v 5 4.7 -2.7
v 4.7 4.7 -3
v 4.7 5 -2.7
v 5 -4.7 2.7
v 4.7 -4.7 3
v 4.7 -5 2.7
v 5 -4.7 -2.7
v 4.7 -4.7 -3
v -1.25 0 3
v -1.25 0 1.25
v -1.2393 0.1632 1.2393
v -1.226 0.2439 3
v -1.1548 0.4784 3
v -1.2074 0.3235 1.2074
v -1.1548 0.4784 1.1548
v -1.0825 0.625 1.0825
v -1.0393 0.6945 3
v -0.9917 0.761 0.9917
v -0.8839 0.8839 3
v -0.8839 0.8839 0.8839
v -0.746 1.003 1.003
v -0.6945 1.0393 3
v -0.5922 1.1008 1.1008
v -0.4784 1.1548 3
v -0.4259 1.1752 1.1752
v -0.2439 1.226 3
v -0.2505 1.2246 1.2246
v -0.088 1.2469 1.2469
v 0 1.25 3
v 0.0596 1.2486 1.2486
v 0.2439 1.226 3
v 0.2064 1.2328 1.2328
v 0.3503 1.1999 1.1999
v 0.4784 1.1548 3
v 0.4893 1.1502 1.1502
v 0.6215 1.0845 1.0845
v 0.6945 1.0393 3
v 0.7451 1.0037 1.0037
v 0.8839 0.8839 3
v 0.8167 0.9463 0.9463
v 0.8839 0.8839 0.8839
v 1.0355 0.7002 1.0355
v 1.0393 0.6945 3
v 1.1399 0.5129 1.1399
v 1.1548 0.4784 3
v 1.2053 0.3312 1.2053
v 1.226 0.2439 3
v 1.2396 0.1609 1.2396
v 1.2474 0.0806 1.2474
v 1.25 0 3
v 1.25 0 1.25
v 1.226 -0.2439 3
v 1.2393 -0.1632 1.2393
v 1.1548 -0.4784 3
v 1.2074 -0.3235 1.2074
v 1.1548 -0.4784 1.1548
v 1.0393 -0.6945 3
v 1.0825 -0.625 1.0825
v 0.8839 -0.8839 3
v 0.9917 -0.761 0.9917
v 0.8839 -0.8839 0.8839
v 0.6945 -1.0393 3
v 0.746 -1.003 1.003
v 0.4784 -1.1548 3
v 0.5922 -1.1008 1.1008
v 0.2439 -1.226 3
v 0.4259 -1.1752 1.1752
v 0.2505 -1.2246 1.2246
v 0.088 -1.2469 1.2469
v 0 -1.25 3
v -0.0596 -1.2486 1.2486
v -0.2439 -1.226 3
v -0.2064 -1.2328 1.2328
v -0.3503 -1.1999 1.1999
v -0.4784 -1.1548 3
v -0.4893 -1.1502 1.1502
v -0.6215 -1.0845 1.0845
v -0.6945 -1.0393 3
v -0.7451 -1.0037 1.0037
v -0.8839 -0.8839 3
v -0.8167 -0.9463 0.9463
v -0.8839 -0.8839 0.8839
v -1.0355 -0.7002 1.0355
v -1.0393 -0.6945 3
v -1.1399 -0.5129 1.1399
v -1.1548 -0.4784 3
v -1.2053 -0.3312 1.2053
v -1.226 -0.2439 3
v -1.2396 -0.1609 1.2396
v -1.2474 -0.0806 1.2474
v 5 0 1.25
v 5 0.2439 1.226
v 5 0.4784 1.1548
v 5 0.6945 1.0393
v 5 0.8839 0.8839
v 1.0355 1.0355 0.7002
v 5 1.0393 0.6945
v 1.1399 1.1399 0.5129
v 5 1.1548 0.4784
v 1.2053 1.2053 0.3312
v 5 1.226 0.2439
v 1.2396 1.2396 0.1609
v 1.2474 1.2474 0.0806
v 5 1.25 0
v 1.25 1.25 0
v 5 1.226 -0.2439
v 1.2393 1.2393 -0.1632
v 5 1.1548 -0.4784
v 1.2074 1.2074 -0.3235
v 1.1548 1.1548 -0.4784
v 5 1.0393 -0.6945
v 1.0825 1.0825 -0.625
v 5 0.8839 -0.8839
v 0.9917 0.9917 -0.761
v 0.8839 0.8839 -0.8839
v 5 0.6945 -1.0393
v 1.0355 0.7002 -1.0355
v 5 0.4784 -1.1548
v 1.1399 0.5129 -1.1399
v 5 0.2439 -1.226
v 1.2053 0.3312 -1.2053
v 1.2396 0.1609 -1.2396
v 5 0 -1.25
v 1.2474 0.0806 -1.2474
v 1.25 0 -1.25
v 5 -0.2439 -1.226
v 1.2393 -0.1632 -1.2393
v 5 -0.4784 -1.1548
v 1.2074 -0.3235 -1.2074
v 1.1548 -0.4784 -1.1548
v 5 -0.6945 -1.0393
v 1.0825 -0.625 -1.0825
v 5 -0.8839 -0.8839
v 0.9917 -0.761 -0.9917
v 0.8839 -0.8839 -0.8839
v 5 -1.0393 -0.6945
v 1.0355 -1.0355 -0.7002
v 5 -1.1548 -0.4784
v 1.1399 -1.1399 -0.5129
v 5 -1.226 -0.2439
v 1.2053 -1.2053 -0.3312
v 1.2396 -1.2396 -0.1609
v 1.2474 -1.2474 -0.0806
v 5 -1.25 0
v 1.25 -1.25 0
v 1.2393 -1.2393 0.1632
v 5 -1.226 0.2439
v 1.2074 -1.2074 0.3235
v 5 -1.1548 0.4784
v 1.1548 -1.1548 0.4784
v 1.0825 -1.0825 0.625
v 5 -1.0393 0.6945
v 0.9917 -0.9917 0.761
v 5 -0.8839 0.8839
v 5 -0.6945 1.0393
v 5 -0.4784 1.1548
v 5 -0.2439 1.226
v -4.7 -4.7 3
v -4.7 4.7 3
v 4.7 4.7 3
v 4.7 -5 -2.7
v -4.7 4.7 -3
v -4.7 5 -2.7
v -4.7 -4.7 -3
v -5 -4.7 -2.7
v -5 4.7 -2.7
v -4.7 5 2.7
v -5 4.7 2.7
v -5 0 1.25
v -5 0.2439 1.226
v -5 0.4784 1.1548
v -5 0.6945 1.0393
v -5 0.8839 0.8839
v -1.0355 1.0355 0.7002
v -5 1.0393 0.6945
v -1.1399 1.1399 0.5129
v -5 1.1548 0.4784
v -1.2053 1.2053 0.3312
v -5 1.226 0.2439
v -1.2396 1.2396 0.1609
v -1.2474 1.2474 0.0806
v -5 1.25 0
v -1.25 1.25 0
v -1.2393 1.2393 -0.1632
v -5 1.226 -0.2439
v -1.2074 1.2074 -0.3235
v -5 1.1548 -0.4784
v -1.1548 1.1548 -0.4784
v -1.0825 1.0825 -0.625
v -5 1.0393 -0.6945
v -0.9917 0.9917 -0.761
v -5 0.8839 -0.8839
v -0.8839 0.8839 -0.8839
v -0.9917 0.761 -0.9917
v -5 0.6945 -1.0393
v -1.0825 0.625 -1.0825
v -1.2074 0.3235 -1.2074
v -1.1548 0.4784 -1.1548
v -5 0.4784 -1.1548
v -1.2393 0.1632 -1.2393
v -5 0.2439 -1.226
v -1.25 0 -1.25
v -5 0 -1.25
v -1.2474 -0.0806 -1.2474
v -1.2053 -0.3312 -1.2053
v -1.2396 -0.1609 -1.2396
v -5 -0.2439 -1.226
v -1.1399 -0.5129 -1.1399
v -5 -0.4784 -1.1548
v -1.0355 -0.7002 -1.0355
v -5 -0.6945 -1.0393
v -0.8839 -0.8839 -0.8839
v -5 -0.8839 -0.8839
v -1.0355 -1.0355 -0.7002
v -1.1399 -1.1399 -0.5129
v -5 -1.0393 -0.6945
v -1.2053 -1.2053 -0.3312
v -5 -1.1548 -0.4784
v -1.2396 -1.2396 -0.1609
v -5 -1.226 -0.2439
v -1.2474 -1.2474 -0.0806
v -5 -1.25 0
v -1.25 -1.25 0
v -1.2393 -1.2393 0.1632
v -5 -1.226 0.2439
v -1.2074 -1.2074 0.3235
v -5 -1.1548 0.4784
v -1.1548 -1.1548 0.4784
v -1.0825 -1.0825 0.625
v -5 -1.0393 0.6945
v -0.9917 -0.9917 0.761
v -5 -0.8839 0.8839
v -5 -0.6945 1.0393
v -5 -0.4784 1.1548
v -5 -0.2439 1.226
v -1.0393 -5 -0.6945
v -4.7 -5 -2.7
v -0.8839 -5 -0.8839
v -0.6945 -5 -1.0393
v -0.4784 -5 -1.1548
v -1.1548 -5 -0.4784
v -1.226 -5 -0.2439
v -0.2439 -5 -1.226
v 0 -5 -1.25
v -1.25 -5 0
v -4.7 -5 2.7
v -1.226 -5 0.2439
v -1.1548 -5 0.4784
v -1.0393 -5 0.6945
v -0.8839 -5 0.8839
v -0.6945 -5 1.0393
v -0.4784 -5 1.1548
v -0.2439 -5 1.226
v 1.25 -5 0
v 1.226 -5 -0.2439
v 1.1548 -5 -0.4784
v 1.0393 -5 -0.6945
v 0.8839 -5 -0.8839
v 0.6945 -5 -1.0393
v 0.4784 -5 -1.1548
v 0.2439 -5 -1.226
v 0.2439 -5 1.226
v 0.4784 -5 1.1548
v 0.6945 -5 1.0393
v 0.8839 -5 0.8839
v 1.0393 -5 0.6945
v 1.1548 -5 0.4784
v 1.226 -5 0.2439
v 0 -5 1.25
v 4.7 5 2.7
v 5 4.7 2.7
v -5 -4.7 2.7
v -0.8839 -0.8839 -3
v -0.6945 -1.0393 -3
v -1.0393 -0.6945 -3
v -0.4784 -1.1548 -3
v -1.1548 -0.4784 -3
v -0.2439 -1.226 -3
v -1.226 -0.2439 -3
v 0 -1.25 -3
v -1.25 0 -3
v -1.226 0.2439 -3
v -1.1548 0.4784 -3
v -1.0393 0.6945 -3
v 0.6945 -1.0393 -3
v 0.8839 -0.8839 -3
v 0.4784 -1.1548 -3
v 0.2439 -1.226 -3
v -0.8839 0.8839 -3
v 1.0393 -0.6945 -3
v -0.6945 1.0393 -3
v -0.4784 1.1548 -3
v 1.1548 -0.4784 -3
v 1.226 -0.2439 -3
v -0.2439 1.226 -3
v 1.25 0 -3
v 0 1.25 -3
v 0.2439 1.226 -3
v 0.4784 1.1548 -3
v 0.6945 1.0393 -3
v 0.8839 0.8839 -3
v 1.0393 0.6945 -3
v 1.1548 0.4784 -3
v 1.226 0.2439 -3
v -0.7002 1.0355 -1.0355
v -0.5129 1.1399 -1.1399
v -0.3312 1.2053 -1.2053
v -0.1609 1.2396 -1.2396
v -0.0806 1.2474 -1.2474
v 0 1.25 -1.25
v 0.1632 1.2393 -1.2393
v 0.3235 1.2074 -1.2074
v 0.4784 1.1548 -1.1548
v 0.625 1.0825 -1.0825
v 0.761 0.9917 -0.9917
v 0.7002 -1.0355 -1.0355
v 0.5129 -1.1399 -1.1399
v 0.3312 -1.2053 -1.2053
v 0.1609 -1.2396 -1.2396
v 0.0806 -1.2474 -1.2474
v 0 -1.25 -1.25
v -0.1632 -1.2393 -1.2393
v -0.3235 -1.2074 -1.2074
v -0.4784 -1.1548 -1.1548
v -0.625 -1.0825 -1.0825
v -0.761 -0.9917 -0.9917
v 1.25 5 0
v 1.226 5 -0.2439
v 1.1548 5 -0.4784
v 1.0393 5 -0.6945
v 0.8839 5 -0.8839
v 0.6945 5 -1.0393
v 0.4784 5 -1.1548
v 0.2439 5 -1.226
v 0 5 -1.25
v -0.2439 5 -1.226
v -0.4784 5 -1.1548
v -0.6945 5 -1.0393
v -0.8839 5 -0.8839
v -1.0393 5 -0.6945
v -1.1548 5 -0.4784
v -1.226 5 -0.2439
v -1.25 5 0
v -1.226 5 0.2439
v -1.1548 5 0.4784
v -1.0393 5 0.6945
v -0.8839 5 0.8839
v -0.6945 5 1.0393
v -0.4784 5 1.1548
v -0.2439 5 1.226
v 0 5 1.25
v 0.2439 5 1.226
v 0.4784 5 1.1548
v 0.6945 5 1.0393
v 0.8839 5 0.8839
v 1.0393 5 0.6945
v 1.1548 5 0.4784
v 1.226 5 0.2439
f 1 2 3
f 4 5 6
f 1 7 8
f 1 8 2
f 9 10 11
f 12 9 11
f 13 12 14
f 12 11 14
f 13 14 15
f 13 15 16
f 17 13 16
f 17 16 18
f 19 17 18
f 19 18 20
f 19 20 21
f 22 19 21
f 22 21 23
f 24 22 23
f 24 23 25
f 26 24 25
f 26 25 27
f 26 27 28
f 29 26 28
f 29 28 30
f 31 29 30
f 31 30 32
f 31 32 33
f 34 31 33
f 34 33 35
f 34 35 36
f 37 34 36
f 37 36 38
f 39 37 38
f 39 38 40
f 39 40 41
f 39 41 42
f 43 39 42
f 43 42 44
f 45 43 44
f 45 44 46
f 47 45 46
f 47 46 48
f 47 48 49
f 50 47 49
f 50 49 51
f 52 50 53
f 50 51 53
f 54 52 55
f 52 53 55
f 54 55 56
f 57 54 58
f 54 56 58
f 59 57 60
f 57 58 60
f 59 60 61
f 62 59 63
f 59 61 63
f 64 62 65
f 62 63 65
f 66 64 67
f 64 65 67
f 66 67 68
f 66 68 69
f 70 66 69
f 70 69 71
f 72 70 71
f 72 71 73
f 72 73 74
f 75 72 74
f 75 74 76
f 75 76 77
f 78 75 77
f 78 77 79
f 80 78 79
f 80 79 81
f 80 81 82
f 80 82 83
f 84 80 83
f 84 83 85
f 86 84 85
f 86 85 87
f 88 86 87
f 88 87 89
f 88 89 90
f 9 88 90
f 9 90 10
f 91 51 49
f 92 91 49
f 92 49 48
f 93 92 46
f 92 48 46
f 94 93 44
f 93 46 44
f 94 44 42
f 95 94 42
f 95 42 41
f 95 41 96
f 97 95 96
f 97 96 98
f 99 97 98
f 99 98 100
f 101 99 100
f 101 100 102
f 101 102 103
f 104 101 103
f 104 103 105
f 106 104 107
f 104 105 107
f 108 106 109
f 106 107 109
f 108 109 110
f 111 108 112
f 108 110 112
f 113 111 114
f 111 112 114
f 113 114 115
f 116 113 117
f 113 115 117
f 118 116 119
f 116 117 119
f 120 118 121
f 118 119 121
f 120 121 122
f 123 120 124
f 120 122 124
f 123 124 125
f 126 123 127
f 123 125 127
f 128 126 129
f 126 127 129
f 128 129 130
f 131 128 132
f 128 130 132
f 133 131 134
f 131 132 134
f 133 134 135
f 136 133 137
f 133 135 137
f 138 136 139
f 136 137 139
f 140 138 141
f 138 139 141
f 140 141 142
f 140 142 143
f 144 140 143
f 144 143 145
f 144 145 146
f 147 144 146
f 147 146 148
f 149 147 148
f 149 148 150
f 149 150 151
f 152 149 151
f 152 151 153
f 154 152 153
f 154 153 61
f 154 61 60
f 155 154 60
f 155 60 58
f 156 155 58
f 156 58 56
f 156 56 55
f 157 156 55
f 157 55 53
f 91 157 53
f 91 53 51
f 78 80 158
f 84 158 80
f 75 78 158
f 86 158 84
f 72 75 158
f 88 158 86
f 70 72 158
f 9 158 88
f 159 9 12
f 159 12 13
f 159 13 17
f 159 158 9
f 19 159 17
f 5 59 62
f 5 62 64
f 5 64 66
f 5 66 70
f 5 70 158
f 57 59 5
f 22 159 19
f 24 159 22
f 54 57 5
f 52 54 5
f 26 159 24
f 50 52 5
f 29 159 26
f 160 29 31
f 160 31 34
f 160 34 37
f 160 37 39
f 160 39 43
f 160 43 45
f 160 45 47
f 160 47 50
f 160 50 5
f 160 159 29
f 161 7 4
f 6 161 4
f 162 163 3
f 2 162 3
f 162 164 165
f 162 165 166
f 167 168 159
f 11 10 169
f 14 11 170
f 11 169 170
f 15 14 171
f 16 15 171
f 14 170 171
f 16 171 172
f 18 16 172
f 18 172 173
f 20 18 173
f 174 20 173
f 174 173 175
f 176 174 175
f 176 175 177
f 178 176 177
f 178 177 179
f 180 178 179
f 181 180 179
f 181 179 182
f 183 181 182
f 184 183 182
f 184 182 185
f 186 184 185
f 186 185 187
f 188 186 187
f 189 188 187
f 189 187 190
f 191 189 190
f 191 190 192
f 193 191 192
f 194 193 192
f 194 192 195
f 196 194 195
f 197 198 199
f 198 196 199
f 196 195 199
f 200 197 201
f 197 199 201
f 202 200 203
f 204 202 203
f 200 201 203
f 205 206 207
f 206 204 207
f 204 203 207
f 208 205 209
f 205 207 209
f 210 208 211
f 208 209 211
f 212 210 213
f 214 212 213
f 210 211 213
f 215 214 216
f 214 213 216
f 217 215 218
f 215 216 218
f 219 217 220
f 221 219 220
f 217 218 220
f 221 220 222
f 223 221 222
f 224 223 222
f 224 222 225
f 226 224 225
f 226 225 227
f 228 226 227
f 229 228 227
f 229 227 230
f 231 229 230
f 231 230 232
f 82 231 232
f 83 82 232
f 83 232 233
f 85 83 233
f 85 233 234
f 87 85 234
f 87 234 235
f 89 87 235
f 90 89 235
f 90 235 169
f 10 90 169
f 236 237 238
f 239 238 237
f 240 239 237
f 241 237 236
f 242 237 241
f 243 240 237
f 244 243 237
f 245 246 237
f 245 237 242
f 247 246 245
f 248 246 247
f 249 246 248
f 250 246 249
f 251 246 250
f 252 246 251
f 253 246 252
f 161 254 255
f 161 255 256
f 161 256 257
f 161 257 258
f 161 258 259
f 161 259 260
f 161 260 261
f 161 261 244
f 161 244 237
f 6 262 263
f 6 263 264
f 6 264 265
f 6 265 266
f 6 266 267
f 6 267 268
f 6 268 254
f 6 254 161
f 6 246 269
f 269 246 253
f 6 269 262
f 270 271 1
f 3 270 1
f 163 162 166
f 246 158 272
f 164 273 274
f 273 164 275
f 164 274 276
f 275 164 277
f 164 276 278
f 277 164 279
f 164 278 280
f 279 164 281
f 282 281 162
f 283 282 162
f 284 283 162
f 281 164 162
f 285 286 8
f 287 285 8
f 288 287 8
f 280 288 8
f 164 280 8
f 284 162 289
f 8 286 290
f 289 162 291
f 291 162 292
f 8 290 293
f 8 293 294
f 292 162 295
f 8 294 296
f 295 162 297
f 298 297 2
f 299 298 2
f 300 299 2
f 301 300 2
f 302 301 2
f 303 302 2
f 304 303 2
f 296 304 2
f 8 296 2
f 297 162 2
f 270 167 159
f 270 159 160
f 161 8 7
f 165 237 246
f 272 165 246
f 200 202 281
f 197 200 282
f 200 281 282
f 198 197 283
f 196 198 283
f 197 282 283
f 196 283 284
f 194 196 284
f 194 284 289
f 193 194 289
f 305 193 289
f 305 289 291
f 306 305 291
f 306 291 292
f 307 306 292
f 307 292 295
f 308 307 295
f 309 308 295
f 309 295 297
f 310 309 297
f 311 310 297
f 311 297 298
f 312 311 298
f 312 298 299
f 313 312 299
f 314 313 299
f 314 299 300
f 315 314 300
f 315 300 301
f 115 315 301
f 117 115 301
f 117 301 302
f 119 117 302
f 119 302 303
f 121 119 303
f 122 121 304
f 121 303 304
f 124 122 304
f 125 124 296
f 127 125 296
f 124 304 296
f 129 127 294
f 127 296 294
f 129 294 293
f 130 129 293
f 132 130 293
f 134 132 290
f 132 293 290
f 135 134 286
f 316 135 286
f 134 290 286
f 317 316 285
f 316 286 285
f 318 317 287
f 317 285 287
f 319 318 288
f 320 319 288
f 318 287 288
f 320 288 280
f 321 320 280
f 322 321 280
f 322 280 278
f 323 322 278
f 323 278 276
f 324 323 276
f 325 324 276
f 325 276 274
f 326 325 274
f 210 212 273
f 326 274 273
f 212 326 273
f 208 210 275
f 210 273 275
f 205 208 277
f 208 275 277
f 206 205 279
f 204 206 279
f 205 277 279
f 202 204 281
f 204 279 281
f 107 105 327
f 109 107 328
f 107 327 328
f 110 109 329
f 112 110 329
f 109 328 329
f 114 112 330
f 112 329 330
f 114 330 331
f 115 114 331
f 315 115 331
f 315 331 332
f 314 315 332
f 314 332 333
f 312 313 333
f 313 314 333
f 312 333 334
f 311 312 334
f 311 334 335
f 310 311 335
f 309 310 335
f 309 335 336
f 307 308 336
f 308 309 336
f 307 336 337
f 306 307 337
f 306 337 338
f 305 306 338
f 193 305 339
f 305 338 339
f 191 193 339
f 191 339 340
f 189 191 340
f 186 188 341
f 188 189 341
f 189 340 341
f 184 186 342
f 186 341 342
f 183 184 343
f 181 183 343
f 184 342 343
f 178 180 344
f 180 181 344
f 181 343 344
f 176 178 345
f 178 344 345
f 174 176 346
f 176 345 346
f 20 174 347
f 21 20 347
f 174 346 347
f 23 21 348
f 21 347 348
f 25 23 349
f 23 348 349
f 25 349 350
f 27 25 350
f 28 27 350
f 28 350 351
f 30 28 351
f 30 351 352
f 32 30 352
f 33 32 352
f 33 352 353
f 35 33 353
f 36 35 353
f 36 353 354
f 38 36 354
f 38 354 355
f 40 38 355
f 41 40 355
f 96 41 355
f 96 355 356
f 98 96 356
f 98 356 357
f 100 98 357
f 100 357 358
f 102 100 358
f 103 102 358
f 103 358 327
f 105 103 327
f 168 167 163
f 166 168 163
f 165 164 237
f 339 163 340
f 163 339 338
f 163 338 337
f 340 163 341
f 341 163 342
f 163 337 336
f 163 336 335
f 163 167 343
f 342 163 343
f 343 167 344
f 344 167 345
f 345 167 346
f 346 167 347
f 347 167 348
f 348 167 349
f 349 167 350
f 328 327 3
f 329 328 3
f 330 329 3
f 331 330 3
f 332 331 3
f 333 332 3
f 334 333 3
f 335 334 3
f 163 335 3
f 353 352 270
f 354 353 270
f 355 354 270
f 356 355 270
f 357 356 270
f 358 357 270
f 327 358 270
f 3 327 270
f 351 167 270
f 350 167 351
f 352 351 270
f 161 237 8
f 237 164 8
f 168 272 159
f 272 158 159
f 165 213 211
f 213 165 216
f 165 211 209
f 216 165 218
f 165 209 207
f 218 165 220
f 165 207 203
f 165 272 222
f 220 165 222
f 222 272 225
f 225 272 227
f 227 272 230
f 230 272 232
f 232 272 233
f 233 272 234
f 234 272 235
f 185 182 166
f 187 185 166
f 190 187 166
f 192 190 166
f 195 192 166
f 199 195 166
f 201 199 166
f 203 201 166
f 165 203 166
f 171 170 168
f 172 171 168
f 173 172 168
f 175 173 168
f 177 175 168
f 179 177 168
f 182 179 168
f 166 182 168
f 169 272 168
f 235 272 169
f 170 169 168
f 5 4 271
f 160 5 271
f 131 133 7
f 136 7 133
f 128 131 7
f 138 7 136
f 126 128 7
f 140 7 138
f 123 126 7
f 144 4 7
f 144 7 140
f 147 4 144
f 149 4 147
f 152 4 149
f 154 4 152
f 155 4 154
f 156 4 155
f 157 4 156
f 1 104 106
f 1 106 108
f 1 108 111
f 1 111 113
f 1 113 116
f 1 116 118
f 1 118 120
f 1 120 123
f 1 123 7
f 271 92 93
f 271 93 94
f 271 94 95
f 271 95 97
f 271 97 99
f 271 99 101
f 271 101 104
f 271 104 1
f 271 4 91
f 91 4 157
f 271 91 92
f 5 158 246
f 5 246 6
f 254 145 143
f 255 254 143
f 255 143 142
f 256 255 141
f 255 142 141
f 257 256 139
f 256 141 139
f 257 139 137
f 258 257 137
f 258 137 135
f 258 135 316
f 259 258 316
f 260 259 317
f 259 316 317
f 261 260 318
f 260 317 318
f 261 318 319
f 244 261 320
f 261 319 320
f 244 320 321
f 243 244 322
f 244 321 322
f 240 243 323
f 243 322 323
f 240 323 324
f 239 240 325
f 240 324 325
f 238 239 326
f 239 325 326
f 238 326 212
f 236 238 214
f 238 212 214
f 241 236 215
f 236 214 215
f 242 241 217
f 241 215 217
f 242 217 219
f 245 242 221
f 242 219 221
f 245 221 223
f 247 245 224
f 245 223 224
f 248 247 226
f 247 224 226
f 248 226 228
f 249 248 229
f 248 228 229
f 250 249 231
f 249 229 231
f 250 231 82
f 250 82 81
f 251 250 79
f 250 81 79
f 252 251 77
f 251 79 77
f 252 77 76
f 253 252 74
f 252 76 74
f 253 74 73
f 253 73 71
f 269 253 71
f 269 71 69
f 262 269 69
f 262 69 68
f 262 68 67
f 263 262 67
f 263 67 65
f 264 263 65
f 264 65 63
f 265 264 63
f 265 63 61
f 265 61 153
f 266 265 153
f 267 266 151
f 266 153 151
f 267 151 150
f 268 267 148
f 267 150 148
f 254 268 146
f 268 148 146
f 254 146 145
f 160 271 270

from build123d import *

# Parameters (mm, degrees)
SKETCH_1_W      = 10
SKETCH_1_H      = 10
EXTRUDE_1_DEPTH = 3
HOLE_WIZARD_1_D = 2.5
HOLE_WIZARD_2_D = 2.5
HOLE_WIZARD_3_D = 2.5
CHAMFER_1_SIZE  = 0.3


with BuildPart() as part:
    # 草图1 → 凸台-拉伸1 (new, symmetric)
    with BuildSketch(Plane.XY):
        Rectangle(SKETCH_1_W, SKETCH_1_H)
    extrude(amount=EXTRUDE_1_DEPTH, both=True)

    # 螺纹孔1 (through all)
    with Locations(Plane.XY.offset(3)):
        with Locations((0, 0)):
            Hole(HOLE_WIZARD_1_D / 2)

    # Hole Wizard 2 (through all)
    with Locations(Plane(origin=(5, 0, 0), x_dir=(0, 0, -1), z_dir=(1, 0, 0))):
        with Locations((0, 0)):
            Hole(HOLE_WIZARD_2_D / 2)

    # 螺纹孔3 (through all)
    with Locations(Plane(origin=(0, -5, 0), x_dir=(-1, 0, 0), z_dir=(0, -1, 0))):
        with Locations((0, 0)):
            Hole(HOLE_WIZARD_3_D / 2)

    # 倒角1
    chamfer_1_edges = [part.edges().sort_by_distance(p)[0] for p in [
        (-5, 0, 3),
        (0, -5, 3),
        (5, 0, 3),
        (0, -5, -3),
        (-5, 0, -3),
        (0, 5, -3),
        (5, 0, -3),
        (5, -5, 0),
        (-5, -5, 0),
        (-5, 5, 0),
        (5, 5, 0),
        (0, 5, 3),
    ]]
    chamfer(chamfer_1_edges, length=CHAMFER_1_SIZE)


solid = part.part
